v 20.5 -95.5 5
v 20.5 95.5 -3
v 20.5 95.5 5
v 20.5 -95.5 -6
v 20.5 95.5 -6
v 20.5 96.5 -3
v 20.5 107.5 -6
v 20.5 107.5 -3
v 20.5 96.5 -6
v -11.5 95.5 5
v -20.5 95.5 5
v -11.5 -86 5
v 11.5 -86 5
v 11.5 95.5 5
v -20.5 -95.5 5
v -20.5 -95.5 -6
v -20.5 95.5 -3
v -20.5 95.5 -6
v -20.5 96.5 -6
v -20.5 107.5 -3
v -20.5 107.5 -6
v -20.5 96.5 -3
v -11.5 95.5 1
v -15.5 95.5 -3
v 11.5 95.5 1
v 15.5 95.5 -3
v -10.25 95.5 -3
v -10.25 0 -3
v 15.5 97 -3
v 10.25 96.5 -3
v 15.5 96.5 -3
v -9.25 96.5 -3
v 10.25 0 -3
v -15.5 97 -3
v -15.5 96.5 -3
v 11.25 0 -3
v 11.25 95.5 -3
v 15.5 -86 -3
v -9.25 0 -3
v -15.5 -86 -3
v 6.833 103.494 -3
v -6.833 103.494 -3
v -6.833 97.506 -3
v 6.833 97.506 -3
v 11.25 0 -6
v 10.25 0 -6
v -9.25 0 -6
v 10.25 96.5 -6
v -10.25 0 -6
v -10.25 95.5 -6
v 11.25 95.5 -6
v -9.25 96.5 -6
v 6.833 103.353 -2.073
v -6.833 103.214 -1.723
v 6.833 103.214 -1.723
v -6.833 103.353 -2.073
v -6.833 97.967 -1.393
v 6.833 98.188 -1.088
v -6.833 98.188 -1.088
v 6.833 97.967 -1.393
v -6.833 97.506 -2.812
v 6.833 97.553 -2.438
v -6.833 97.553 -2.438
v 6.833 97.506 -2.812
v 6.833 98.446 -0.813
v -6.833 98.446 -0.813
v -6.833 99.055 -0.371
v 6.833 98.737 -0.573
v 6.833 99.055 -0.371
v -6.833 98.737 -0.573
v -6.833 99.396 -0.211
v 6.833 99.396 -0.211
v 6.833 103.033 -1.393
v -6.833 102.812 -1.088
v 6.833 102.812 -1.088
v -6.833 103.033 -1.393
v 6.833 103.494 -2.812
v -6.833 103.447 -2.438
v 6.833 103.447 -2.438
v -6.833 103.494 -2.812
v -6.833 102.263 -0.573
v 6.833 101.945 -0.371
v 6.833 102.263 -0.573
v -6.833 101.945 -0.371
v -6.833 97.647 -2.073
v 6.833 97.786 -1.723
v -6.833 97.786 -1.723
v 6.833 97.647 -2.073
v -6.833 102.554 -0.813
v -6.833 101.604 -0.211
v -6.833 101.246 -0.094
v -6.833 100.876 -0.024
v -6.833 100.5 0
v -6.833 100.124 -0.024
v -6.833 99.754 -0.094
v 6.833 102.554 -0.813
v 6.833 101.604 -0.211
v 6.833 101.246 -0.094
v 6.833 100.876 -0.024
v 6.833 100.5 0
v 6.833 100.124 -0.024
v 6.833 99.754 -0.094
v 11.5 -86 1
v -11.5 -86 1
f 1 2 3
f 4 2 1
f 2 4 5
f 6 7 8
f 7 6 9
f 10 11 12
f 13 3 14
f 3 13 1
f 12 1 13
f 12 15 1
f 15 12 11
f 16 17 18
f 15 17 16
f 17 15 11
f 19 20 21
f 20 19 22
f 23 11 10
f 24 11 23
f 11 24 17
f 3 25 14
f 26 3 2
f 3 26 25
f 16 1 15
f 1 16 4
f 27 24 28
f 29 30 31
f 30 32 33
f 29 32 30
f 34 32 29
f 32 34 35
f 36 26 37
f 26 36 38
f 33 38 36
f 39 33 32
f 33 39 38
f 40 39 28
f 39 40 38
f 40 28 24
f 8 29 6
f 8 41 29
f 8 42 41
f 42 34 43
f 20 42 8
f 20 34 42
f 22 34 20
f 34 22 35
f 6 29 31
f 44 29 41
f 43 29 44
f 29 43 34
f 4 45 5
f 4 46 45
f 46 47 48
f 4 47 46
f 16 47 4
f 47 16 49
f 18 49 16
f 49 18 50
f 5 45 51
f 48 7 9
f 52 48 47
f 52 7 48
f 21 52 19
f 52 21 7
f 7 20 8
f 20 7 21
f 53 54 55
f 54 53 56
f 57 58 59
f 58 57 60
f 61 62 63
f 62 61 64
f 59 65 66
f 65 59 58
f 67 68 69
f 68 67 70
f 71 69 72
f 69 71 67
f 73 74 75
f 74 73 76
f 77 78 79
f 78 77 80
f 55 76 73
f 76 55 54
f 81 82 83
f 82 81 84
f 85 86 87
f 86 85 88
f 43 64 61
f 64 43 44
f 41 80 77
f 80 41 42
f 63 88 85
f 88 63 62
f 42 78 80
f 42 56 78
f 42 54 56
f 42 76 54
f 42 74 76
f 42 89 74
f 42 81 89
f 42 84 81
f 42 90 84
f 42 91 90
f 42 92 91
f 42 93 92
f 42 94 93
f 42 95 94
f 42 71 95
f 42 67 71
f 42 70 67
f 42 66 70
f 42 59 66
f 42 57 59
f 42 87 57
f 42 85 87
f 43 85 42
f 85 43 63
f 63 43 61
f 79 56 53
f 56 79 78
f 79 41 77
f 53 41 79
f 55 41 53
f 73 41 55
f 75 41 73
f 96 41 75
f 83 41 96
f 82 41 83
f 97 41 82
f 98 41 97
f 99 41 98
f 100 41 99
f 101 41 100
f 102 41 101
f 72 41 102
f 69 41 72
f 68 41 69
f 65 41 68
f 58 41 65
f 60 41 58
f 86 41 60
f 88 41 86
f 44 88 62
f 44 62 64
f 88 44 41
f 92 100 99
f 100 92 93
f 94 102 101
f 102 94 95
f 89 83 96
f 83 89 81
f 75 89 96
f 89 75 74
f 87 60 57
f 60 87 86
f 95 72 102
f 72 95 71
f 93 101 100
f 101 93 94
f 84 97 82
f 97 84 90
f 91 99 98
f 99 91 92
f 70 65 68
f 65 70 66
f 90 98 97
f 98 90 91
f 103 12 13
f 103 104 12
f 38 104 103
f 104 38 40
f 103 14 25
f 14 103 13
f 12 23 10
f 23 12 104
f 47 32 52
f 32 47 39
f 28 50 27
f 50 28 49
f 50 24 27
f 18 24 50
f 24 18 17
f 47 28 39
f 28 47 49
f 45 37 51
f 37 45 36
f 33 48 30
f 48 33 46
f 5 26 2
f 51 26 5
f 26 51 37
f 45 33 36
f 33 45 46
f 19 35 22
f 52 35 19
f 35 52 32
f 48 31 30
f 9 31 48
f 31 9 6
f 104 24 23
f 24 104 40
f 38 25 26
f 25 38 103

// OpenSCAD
/* [Base] */

NUMBERSOCKETS = 8;

/* [Hidden] */
BASE=21;

case();

module case()
{   
 obWidth = BASE+20;
 obLength = (BASE+1)*NUMBERSOCKETS+15;

 difference()
  {
    difference()
    {
      outerBlock(obWidth, obLength);
      union()
      {
       translate([0,BASE/2-5,-1])
        cube([BASE+10, (BASE)*NUMBERSOCKETS+15, 4], center=true);            
       translate([0,BASE/2-5,1])
        cube([BASE+2, (BASE)*NUMBERSOCKETS+15, 8], center=true);
      }        
    }
    cuts(obWidth, obLength);
  }
       tracks(obWidth, obLength);
}

module outerBlock(obWidth, obLength)
{
    union()
    {
      cube([obWidth, obLength, 10], center=true); 
      translate([0,6,-4.5])
       cube([obWidth, obLength+12,3], center=true); 
      translate([0,obLength/2+5,-3])
       rotate([0,90,0])
        cylinder(r=3,h=obWidth/3, $fn=50, center=true); 
    }
}

module cuts(obWidth, obLength)
{
   union()
   { 
    translate([-obWidth/4,0,-7])
     cube([1,obLength/2,4]);
    translate([obWidth/4,0,-7])
     cube([1,obLength/2,4]);     
    translate([-obWidth/2,obLength/2,-6])
     cube([obWidth/4+1,1,3]);      
    translate([obWidth/4,obLength/2,-6])
     cube([obWidth/4,1,3]); 
   }
}

module tracks(obWidth, obLength)
{
    union()
    {
        track(obWidth, obLength);
        mirror([1,0,0]) track(obWidth, obLength);
    }
}

module track(obWidth, obLength)
{
 translate([-obWidth/4-5.25,-obLength/2,-3.0])
 polyhedron(
    points=[ [0,0,0],[0,0,4],[4,0,4],
           [0,obLength,0],[0,obLength,4],[4,obLength,4]  ], 
    faces=[ [0,1,2],[4,1,0,3],[1,4,5,2],[0,2,5,3],              
              [5,4,3] ]                         
 );
    
}
